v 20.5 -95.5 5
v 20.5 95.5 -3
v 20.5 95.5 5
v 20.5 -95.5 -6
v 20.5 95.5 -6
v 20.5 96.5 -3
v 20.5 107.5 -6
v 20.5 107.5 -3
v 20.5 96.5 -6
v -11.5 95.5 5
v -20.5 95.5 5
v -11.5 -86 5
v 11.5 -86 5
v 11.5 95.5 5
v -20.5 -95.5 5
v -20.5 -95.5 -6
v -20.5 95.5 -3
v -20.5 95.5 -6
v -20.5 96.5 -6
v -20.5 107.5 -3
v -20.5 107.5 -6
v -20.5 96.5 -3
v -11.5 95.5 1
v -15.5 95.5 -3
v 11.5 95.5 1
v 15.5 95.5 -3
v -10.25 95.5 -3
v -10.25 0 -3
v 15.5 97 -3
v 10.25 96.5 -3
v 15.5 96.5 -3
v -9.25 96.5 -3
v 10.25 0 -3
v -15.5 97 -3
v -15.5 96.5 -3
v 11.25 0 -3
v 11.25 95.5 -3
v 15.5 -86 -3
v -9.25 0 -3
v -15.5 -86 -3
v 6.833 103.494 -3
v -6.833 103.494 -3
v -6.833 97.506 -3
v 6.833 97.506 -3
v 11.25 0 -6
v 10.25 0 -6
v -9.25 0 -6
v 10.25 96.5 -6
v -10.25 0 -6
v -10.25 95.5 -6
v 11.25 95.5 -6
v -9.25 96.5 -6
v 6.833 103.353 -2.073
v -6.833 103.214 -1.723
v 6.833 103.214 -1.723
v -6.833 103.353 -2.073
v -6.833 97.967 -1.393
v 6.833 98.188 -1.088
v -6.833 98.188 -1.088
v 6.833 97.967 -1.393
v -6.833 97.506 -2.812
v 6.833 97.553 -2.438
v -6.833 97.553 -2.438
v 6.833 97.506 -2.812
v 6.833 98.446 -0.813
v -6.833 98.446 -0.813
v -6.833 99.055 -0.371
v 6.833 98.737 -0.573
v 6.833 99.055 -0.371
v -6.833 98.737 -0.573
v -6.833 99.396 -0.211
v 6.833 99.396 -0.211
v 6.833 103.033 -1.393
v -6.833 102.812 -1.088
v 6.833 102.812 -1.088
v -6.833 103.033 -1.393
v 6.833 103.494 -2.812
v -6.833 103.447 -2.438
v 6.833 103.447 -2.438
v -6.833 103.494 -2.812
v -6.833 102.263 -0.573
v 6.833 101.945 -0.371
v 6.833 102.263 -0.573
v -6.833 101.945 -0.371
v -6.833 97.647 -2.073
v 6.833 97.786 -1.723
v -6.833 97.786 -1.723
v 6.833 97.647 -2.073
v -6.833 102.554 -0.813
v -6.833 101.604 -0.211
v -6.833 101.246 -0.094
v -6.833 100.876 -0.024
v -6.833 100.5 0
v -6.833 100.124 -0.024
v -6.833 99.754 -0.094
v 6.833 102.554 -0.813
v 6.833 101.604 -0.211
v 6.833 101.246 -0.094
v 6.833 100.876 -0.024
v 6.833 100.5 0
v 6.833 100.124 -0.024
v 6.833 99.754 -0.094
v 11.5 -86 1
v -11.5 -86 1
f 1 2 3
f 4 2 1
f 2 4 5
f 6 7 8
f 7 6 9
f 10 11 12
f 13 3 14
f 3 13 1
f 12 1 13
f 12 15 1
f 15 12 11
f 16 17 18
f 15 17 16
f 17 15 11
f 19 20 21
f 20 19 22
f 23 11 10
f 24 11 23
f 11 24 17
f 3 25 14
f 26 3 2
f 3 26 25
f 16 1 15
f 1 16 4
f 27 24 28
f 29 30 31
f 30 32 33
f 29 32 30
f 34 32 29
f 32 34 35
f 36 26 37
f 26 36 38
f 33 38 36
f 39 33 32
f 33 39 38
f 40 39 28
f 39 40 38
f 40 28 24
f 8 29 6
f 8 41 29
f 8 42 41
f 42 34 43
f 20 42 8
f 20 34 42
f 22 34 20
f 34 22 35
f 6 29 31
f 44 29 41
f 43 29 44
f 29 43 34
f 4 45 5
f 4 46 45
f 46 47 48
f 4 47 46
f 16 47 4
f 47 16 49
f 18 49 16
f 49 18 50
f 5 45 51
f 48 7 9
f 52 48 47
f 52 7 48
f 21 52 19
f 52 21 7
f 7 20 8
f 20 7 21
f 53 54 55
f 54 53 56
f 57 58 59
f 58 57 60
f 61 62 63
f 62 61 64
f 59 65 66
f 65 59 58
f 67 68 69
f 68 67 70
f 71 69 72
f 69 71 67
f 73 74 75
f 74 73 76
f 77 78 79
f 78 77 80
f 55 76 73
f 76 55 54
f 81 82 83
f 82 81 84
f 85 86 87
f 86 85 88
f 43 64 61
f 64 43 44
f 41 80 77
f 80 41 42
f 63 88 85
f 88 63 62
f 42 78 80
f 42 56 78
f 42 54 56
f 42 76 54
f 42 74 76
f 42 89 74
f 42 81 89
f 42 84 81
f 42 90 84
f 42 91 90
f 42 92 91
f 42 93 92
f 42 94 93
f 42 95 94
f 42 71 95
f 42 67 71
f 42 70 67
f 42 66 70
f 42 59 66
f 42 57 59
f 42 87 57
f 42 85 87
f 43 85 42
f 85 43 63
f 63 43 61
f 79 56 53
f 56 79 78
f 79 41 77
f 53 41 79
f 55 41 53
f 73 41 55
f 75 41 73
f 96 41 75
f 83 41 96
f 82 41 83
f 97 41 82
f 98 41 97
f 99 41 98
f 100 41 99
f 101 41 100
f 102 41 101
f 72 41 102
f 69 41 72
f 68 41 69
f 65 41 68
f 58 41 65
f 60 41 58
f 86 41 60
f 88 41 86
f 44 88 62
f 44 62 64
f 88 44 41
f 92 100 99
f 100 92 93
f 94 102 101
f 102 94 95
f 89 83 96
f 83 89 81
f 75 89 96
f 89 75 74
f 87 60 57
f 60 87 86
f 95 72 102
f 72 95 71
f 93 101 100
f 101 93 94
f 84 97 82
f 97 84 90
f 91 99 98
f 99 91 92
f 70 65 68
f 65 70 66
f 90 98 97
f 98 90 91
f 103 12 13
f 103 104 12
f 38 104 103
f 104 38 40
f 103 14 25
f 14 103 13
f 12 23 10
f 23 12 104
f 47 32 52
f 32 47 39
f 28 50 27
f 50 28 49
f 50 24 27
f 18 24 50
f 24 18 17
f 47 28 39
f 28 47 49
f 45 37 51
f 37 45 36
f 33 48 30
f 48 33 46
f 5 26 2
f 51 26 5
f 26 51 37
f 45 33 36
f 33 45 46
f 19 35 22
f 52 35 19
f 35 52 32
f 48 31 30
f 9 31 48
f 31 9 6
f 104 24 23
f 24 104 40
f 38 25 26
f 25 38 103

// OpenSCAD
/* [Base] */

NUMBERSOCKETS = 8;

/* [Hidden] */
BASE=21;

case();

module case()
{   
 obWidth = BASE+20;
 obLength = (BASE+1)*NUMBERSOCKETS+15;

 difference()
  {
    difference()
    {
      outerBlock(obWidth, obLength);
      union()
      {
       translate([0,BASE/2-5,-1])
        cube([BASE+10, (BASE)*NUMBERSOCKETS+15, 4], center=true);            
       translate([0,BASE/2-5,1])
        cube([BASE+2, (BASE)*NUMBERSOCKETS+15, 8], center=true);
      }        
    }
    cuts(obWidth, obLength);
  }
       tracks(obWidth, obLength);
}

module outerBlock(obWidth, obLength)
{
    union()
    {
      cube([obWidth, obLength, 10], center=true); 
      translate([0,6,-4.5])
       cube([obWidth, obLength+12,3], center=true); 
      translate([0,obLength/2+5,-3])
       rotate([0,90,0])
        cylinder(r=3,h=obWidth/3, $fn=50, center=true); 
    }
}

module cuts(obWidth, obLength)
{
   union()
   { 
    translate([-obWidth/4,0,-7])
     cube([1,obLength/2,4]);
    translate([obWidth/4,0,-7])
     cube([1,obLength/2,4]);     
    translate([-obWidth/2,obLength/2,-6])
     cube([obWidth/4+1,1,3]);      
    translate([obWidth/4,obLength/2,-6])
     cube([obWidth/4,1,3]); 
   }
}

module tracks(obWidth, obLength)
{
    union()
    {
        track(obWidth, obLength);
        mirror([1,0,0]) track(obWidth, obLength);
    }
}

module track(obWidth, obLength)
{
 translate([-obWidth/4-5.25,-obLength/2,-3.0])
 polyhedron(
    points=[ [0,0,0],[0,0,4],[4,0,4],
           [0,obLength,0],[0,obLength,4],[4,obLength,4]  ], 
    faces=[ [0,1,2],[4,1,0,3],[1,4,5,2],[0,2,5,3],              
              [5,4,3] ]                         
 );
    
}
